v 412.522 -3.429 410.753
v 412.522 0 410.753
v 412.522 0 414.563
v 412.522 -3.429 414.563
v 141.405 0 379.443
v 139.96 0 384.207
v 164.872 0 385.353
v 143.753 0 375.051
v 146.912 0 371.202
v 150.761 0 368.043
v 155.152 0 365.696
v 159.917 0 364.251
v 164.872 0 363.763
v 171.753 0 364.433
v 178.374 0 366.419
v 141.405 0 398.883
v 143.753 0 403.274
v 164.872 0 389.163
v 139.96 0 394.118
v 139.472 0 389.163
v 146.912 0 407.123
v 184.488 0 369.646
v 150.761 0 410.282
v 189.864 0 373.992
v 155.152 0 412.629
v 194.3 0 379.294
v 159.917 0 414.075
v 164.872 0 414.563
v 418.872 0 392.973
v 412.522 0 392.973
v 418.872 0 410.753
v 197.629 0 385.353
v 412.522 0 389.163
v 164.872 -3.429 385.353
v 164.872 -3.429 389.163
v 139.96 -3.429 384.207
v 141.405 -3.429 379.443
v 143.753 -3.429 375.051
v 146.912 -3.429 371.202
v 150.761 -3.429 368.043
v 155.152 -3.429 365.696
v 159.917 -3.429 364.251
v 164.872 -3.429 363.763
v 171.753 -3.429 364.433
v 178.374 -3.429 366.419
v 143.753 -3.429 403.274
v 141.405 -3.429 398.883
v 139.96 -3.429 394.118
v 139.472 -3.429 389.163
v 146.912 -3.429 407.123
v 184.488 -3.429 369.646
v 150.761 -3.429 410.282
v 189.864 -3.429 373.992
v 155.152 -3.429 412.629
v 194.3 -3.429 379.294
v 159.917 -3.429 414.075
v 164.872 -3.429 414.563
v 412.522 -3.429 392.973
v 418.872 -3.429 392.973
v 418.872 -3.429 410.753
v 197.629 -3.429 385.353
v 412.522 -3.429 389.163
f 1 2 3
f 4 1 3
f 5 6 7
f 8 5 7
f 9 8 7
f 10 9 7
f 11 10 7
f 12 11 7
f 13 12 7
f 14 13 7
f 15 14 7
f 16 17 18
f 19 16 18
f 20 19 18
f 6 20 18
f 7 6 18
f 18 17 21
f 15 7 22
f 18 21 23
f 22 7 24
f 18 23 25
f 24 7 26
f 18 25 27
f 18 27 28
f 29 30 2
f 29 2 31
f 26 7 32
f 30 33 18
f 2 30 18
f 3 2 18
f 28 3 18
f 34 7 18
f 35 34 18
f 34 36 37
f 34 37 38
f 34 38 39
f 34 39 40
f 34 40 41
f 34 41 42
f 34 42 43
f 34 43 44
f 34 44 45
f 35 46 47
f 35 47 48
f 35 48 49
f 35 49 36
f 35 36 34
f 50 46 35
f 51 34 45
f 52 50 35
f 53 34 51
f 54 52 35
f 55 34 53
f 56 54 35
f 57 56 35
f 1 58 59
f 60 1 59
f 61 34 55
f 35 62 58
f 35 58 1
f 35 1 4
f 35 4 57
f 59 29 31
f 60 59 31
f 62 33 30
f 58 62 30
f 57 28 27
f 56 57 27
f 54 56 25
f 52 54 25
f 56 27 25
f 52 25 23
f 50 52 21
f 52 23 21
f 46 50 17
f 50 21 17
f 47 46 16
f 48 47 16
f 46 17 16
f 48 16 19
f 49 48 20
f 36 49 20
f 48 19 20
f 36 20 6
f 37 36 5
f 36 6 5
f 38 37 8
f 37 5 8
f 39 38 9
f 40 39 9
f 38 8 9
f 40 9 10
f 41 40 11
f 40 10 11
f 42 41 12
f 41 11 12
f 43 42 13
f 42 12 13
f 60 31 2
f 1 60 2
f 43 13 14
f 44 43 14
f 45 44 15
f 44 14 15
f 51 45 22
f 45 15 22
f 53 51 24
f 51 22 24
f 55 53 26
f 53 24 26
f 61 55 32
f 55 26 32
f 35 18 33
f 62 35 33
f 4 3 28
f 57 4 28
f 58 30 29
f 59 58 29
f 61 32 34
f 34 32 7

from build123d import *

# Parameters (mm, degrees)
F1_DEPTH = 3.429


# Not quite as in the source:
# - ends of sketch curves that miss each other by under 0.0002 mm in the source are joined


with BuildPart() as f1:
    # F0 (on Front) → F1 (new body)
    with BuildSketch(Plane.XZ):
        with BuildLine():
            Line((412.522035, 410.7526964), (412.522035, 414.5626964))
            Line((412.522035, 414.5626964), (164.872035, 414.5626964))
            ThreePointArc((164.872035, 414.5626964), (139.472035, 389.1626964), (164.872035, 363.7626964))
            ThreePointArc((164.872035, 363.7626964), (184.4881935266, 369.6456603814), (197.6294252739, 385.352696025))
            Line((197.6294252739, 385.352696025), (164.872035, 385.3526964))
            Line((164.872035, 385.3526964), (164.872035, 389.1626964))
            Line((164.872035, 389.1626964), (412.522035, 389.1626964))
            Line((412.522035, 389.1626964), (412.522035, 392.9726964))
            Line((412.522035, 392.9726964), (418.872035, 392.9726964))
            Line((418.872035, 392.9726964), (418.872035, 410.7526964))
            Line((418.872035, 410.7526964), (412.522035, 410.7526964))
        make_face()
    extrude(amount=F1_DEPTH)


solid = f1.part
